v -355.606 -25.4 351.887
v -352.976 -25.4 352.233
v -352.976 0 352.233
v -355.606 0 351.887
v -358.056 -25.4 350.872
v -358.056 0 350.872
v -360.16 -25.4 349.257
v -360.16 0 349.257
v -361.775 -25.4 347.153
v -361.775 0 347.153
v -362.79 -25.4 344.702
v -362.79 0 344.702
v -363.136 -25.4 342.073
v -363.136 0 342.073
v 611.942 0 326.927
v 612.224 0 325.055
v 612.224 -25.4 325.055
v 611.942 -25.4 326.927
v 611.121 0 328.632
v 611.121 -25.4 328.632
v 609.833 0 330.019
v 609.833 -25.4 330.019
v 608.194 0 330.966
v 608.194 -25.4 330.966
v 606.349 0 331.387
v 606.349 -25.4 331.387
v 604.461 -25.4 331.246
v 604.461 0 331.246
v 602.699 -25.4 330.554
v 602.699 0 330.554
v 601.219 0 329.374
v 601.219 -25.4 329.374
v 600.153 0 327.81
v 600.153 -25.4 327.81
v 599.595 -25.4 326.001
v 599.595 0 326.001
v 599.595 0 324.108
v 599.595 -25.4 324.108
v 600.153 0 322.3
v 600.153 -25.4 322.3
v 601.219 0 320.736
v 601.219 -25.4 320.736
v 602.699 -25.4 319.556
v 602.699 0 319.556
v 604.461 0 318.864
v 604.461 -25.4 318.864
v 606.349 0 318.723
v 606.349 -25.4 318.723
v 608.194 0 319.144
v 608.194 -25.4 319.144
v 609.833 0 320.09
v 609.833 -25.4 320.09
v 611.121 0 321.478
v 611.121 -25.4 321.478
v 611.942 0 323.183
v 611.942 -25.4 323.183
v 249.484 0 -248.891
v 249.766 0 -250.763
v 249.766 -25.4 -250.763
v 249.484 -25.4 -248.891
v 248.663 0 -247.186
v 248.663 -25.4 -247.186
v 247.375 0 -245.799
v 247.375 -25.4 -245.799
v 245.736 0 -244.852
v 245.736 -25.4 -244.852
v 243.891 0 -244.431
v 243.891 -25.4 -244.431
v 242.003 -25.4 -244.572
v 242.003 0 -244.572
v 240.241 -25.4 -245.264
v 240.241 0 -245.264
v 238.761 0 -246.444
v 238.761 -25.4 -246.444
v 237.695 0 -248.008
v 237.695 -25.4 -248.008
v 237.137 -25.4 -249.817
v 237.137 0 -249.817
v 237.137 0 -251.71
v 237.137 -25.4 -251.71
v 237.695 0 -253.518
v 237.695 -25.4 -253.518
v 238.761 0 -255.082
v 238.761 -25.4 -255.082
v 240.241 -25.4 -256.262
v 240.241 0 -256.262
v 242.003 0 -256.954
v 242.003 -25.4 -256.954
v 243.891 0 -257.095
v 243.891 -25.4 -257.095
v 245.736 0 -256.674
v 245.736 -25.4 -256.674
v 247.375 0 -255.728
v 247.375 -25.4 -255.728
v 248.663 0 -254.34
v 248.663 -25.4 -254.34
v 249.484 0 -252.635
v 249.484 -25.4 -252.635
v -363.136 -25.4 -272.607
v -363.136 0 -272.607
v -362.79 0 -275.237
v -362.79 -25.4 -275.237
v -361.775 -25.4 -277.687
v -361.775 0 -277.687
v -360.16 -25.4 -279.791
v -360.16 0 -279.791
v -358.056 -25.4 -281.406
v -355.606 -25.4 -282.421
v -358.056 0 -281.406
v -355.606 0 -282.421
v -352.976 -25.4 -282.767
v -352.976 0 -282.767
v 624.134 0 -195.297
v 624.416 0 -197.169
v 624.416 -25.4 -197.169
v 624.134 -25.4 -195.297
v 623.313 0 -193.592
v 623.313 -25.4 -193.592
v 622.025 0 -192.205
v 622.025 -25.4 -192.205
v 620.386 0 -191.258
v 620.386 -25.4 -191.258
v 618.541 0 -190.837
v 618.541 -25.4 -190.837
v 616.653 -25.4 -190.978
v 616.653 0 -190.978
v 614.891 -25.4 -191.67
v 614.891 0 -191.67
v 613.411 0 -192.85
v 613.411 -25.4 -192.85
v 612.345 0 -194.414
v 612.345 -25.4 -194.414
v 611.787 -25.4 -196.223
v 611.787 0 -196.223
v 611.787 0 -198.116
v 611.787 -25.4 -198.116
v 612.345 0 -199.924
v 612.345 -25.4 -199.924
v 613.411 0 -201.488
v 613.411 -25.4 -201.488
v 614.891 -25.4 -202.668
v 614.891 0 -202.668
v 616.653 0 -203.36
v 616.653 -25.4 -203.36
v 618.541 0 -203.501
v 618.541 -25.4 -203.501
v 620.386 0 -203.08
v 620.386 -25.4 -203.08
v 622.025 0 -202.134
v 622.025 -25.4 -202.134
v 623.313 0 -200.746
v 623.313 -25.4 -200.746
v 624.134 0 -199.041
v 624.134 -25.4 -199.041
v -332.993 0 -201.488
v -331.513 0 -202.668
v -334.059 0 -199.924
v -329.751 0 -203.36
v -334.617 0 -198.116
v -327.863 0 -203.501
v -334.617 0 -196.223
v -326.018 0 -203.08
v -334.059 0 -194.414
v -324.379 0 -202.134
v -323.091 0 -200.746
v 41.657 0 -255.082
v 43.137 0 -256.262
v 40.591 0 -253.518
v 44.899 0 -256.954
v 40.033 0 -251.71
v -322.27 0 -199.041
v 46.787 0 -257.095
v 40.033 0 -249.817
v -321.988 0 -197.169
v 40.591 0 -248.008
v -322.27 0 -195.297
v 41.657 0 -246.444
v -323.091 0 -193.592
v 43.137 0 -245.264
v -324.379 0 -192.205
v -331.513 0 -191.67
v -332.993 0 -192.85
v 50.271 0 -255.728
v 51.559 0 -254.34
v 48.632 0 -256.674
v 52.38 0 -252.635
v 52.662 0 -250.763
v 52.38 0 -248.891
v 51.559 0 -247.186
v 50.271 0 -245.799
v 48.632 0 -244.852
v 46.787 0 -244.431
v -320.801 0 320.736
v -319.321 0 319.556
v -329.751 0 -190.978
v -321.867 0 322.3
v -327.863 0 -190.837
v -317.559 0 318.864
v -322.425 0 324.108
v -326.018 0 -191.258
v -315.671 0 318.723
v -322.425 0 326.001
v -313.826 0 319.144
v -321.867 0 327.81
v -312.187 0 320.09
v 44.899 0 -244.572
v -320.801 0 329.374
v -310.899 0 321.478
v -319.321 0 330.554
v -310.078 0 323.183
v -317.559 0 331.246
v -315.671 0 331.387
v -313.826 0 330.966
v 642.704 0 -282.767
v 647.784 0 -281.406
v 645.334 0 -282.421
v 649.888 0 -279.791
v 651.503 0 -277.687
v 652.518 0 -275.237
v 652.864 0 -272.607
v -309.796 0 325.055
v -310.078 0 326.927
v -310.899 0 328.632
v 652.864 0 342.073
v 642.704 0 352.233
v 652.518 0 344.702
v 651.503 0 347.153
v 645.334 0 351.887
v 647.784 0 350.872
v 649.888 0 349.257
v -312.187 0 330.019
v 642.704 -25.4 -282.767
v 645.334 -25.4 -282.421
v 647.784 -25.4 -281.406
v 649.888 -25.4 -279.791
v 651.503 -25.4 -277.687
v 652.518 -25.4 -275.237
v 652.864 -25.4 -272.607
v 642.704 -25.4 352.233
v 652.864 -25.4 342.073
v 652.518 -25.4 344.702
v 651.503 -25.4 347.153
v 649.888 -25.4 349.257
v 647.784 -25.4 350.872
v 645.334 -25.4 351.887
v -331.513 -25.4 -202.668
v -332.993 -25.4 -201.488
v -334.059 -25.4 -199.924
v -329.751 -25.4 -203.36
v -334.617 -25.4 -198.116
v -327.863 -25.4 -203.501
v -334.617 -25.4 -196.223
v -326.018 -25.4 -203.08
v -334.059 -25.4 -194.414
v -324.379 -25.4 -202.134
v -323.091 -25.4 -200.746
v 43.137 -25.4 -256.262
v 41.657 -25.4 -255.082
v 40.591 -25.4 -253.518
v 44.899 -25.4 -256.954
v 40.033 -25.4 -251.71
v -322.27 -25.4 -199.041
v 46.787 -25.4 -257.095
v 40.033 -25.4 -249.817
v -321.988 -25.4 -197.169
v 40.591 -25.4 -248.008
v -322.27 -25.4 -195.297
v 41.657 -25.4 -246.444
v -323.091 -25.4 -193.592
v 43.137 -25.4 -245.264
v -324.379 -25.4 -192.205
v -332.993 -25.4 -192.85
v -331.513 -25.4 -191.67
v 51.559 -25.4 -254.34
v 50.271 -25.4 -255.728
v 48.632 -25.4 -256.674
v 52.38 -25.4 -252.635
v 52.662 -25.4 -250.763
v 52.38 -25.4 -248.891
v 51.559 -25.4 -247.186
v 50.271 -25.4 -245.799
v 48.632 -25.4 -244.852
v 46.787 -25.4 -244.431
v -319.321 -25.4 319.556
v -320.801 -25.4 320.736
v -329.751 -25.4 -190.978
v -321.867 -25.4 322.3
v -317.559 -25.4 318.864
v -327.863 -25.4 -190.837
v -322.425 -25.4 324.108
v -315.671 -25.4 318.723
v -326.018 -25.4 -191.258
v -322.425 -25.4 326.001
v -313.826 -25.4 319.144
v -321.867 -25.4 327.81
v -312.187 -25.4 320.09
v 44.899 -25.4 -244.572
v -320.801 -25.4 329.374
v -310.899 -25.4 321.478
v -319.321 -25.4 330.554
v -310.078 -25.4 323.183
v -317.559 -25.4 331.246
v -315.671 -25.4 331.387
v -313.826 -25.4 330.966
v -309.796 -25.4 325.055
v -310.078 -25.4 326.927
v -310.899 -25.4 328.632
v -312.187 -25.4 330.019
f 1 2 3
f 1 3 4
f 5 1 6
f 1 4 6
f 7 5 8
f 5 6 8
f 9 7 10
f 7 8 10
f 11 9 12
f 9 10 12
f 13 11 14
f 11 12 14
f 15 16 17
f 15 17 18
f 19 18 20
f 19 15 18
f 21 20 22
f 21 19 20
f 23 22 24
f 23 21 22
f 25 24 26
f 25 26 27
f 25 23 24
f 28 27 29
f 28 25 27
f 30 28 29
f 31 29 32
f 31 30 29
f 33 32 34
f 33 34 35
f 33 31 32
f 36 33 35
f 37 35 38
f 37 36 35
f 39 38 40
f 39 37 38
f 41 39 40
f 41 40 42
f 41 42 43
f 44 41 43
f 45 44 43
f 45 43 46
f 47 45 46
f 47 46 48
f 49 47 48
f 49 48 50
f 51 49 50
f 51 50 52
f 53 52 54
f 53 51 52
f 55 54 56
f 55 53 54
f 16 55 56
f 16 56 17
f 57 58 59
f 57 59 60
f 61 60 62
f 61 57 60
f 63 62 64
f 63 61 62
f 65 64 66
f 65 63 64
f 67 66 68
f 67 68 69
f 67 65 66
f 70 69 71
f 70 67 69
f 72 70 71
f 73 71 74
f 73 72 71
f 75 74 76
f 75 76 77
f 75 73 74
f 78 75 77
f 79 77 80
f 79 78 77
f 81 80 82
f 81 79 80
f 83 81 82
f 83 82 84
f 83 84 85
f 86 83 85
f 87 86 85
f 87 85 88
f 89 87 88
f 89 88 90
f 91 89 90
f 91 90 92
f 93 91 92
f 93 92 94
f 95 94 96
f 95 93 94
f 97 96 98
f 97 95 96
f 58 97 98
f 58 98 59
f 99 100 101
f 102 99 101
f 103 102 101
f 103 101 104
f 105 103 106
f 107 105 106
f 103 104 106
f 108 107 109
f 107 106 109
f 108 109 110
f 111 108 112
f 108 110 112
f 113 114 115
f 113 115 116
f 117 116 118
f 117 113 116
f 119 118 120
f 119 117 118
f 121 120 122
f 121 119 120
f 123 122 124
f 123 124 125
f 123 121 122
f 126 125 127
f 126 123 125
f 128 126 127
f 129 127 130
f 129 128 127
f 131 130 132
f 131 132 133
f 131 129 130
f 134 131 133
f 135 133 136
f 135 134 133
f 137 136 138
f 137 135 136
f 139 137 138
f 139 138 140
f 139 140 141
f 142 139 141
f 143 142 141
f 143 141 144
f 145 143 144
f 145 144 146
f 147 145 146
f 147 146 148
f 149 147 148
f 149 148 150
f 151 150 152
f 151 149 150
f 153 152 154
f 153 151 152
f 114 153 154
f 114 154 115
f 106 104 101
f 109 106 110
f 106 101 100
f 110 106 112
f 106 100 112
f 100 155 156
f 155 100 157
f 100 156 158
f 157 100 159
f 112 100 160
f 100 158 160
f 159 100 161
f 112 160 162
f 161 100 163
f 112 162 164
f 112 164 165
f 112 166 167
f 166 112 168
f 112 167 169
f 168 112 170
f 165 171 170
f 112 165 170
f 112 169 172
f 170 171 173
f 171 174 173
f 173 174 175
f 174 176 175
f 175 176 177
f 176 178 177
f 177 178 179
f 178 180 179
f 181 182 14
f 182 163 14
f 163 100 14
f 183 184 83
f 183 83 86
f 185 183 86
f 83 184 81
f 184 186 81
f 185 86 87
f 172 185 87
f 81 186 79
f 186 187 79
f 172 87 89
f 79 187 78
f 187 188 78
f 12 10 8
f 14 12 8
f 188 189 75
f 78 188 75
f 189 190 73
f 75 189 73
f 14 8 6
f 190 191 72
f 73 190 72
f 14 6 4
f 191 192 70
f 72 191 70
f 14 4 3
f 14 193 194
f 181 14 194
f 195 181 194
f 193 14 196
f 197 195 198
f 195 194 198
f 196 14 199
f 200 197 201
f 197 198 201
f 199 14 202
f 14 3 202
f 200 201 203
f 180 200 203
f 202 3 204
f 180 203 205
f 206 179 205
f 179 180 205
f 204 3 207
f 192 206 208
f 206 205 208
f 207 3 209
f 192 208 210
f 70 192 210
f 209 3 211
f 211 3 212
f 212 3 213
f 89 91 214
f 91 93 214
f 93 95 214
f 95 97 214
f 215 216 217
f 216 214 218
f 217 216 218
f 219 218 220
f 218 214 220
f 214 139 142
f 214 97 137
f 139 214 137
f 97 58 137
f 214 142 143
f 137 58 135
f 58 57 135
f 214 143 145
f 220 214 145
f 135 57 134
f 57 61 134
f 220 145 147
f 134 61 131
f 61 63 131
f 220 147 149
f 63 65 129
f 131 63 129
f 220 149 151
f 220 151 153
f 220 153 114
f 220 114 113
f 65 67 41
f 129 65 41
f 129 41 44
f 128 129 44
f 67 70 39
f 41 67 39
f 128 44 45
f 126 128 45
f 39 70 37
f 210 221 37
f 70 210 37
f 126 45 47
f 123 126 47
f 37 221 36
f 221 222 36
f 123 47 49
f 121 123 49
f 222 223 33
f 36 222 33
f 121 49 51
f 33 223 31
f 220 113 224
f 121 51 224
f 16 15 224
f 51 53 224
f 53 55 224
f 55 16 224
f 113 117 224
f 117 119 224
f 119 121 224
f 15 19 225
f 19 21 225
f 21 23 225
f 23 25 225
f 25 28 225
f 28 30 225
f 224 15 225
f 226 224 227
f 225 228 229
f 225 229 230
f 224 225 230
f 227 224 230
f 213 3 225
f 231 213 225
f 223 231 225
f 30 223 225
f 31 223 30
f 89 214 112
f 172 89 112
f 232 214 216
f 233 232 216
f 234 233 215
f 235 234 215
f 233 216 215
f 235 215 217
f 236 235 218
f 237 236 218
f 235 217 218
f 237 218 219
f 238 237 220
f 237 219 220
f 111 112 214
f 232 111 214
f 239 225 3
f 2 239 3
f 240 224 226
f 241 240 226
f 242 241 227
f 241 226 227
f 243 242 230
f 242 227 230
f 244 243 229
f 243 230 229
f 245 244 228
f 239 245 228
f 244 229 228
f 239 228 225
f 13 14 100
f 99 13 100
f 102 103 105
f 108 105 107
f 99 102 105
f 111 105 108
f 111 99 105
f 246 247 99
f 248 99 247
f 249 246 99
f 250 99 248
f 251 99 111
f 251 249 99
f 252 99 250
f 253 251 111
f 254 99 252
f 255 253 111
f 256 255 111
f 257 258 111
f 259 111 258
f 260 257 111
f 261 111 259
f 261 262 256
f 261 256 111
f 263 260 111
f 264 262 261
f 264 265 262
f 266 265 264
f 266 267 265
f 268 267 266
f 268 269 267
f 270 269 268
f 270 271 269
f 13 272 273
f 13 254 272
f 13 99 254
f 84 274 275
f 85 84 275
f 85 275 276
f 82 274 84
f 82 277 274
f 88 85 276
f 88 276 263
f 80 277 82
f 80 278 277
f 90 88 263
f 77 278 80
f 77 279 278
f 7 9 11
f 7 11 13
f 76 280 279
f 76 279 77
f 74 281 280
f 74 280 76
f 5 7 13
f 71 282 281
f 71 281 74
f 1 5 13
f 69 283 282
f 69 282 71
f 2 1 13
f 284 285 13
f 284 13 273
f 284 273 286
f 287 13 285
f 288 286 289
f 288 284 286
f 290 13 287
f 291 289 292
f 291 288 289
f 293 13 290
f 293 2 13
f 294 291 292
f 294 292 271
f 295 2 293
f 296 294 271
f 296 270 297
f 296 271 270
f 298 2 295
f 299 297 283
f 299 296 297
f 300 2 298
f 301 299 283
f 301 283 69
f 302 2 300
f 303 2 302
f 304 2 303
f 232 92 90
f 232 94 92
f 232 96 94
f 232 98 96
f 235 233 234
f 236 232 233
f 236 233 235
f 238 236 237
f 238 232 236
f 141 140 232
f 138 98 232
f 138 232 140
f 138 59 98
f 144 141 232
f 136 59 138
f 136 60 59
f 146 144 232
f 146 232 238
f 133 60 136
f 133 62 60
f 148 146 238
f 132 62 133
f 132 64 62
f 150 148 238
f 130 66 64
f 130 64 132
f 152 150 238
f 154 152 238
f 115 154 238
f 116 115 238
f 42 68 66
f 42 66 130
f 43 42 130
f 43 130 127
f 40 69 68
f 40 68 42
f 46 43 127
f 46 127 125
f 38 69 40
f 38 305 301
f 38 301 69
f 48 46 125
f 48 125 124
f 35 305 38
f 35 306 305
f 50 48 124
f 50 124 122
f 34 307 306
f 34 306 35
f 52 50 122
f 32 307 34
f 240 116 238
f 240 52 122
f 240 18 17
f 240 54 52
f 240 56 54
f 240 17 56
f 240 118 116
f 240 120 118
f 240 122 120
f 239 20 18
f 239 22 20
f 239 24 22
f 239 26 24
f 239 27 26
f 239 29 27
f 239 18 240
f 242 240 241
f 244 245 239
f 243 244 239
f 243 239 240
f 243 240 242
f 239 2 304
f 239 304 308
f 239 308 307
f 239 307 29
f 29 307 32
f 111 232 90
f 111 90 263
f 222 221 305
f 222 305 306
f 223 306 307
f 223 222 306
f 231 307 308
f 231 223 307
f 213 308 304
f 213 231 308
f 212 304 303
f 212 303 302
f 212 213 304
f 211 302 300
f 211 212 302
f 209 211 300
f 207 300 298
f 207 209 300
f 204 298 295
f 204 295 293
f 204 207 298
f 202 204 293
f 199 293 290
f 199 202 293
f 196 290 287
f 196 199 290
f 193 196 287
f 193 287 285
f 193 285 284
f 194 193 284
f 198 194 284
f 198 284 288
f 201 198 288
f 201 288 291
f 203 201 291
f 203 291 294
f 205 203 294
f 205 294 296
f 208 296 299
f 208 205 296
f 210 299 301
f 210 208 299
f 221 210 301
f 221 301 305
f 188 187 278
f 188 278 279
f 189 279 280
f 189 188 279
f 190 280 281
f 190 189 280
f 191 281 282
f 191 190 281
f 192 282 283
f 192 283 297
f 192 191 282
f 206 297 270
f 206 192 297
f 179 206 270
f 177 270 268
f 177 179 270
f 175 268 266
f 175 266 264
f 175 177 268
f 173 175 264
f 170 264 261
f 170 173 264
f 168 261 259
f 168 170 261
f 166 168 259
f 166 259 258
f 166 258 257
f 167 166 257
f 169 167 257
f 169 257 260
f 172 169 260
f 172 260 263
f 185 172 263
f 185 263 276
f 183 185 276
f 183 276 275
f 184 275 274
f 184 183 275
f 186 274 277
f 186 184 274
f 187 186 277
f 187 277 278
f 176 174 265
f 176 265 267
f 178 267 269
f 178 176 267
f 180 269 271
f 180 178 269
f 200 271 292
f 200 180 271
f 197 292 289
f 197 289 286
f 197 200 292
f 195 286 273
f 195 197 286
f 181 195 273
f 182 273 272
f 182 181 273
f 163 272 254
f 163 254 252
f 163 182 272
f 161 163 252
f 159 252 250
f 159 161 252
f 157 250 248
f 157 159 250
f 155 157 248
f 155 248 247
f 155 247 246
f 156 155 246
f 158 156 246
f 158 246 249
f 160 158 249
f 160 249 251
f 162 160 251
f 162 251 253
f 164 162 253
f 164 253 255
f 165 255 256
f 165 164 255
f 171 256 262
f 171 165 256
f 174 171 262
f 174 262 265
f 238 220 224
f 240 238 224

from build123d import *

# Parameters (mm, degrees)
F0_R     = 6.35
F1_DEPTH = 25.4


with BuildPart() as f1:
    # F0 (on Front) → F1 (new body)
    with BuildSketch(Plane.XZ):
        with BuildLine():
            Line((642.704073, 352.232811), (-352.975927, 352.232811))
            ThreePointArc((-352.975927, 352.232811), (-360.160132, 349.257016), (-363.135927, 342.072811))
            Line((-363.135927, 342.072811), (-363.135927, -272.607189))
            ThreePointArc((-363.135927, -272.607189), (-360.160132, -279.791394), (-352.975927, -282.767189))
            Line((-352.975927, -282.767189), (642.704073, -282.767189))
            ThreePointArc((642.704073, -282.767189), (649.888278, -279.791394), (652.864073, -272.607189))
            Line((652.864073, -272.607189), (652.864073, 342.072811))
            ThreePointArc((652.864073, 342.072811), (649.888278, 349.257016), (642.704073, 352.232811))
        make_face()
        with Locations((-328.337927, -197.169189)):
            Circle(F0_R, mode=Mode.SUBTRACT)
        with Locations((46.312073, -250.763189)):
            Circle(F0_R, mode=Mode.SUBTRACT)
        with Locations((243.416073, -250.763189)):
            Circle(F0_R, mode=Mode.SUBTRACT)
        with Locations((618.066073, -197.169189)):
            Circle(F0_R, mode=Mode.SUBTRACT)
        with Locations((-316.145927, 325.054811)):
            Circle(F0_R, mode=Mode.SUBTRACT)
        with Locations((605.874073, 325.054811)):
            Circle(F0_R, mode=Mode.SUBTRACT)
    extrude(amount=F1_DEPTH)


solid = f1.part
